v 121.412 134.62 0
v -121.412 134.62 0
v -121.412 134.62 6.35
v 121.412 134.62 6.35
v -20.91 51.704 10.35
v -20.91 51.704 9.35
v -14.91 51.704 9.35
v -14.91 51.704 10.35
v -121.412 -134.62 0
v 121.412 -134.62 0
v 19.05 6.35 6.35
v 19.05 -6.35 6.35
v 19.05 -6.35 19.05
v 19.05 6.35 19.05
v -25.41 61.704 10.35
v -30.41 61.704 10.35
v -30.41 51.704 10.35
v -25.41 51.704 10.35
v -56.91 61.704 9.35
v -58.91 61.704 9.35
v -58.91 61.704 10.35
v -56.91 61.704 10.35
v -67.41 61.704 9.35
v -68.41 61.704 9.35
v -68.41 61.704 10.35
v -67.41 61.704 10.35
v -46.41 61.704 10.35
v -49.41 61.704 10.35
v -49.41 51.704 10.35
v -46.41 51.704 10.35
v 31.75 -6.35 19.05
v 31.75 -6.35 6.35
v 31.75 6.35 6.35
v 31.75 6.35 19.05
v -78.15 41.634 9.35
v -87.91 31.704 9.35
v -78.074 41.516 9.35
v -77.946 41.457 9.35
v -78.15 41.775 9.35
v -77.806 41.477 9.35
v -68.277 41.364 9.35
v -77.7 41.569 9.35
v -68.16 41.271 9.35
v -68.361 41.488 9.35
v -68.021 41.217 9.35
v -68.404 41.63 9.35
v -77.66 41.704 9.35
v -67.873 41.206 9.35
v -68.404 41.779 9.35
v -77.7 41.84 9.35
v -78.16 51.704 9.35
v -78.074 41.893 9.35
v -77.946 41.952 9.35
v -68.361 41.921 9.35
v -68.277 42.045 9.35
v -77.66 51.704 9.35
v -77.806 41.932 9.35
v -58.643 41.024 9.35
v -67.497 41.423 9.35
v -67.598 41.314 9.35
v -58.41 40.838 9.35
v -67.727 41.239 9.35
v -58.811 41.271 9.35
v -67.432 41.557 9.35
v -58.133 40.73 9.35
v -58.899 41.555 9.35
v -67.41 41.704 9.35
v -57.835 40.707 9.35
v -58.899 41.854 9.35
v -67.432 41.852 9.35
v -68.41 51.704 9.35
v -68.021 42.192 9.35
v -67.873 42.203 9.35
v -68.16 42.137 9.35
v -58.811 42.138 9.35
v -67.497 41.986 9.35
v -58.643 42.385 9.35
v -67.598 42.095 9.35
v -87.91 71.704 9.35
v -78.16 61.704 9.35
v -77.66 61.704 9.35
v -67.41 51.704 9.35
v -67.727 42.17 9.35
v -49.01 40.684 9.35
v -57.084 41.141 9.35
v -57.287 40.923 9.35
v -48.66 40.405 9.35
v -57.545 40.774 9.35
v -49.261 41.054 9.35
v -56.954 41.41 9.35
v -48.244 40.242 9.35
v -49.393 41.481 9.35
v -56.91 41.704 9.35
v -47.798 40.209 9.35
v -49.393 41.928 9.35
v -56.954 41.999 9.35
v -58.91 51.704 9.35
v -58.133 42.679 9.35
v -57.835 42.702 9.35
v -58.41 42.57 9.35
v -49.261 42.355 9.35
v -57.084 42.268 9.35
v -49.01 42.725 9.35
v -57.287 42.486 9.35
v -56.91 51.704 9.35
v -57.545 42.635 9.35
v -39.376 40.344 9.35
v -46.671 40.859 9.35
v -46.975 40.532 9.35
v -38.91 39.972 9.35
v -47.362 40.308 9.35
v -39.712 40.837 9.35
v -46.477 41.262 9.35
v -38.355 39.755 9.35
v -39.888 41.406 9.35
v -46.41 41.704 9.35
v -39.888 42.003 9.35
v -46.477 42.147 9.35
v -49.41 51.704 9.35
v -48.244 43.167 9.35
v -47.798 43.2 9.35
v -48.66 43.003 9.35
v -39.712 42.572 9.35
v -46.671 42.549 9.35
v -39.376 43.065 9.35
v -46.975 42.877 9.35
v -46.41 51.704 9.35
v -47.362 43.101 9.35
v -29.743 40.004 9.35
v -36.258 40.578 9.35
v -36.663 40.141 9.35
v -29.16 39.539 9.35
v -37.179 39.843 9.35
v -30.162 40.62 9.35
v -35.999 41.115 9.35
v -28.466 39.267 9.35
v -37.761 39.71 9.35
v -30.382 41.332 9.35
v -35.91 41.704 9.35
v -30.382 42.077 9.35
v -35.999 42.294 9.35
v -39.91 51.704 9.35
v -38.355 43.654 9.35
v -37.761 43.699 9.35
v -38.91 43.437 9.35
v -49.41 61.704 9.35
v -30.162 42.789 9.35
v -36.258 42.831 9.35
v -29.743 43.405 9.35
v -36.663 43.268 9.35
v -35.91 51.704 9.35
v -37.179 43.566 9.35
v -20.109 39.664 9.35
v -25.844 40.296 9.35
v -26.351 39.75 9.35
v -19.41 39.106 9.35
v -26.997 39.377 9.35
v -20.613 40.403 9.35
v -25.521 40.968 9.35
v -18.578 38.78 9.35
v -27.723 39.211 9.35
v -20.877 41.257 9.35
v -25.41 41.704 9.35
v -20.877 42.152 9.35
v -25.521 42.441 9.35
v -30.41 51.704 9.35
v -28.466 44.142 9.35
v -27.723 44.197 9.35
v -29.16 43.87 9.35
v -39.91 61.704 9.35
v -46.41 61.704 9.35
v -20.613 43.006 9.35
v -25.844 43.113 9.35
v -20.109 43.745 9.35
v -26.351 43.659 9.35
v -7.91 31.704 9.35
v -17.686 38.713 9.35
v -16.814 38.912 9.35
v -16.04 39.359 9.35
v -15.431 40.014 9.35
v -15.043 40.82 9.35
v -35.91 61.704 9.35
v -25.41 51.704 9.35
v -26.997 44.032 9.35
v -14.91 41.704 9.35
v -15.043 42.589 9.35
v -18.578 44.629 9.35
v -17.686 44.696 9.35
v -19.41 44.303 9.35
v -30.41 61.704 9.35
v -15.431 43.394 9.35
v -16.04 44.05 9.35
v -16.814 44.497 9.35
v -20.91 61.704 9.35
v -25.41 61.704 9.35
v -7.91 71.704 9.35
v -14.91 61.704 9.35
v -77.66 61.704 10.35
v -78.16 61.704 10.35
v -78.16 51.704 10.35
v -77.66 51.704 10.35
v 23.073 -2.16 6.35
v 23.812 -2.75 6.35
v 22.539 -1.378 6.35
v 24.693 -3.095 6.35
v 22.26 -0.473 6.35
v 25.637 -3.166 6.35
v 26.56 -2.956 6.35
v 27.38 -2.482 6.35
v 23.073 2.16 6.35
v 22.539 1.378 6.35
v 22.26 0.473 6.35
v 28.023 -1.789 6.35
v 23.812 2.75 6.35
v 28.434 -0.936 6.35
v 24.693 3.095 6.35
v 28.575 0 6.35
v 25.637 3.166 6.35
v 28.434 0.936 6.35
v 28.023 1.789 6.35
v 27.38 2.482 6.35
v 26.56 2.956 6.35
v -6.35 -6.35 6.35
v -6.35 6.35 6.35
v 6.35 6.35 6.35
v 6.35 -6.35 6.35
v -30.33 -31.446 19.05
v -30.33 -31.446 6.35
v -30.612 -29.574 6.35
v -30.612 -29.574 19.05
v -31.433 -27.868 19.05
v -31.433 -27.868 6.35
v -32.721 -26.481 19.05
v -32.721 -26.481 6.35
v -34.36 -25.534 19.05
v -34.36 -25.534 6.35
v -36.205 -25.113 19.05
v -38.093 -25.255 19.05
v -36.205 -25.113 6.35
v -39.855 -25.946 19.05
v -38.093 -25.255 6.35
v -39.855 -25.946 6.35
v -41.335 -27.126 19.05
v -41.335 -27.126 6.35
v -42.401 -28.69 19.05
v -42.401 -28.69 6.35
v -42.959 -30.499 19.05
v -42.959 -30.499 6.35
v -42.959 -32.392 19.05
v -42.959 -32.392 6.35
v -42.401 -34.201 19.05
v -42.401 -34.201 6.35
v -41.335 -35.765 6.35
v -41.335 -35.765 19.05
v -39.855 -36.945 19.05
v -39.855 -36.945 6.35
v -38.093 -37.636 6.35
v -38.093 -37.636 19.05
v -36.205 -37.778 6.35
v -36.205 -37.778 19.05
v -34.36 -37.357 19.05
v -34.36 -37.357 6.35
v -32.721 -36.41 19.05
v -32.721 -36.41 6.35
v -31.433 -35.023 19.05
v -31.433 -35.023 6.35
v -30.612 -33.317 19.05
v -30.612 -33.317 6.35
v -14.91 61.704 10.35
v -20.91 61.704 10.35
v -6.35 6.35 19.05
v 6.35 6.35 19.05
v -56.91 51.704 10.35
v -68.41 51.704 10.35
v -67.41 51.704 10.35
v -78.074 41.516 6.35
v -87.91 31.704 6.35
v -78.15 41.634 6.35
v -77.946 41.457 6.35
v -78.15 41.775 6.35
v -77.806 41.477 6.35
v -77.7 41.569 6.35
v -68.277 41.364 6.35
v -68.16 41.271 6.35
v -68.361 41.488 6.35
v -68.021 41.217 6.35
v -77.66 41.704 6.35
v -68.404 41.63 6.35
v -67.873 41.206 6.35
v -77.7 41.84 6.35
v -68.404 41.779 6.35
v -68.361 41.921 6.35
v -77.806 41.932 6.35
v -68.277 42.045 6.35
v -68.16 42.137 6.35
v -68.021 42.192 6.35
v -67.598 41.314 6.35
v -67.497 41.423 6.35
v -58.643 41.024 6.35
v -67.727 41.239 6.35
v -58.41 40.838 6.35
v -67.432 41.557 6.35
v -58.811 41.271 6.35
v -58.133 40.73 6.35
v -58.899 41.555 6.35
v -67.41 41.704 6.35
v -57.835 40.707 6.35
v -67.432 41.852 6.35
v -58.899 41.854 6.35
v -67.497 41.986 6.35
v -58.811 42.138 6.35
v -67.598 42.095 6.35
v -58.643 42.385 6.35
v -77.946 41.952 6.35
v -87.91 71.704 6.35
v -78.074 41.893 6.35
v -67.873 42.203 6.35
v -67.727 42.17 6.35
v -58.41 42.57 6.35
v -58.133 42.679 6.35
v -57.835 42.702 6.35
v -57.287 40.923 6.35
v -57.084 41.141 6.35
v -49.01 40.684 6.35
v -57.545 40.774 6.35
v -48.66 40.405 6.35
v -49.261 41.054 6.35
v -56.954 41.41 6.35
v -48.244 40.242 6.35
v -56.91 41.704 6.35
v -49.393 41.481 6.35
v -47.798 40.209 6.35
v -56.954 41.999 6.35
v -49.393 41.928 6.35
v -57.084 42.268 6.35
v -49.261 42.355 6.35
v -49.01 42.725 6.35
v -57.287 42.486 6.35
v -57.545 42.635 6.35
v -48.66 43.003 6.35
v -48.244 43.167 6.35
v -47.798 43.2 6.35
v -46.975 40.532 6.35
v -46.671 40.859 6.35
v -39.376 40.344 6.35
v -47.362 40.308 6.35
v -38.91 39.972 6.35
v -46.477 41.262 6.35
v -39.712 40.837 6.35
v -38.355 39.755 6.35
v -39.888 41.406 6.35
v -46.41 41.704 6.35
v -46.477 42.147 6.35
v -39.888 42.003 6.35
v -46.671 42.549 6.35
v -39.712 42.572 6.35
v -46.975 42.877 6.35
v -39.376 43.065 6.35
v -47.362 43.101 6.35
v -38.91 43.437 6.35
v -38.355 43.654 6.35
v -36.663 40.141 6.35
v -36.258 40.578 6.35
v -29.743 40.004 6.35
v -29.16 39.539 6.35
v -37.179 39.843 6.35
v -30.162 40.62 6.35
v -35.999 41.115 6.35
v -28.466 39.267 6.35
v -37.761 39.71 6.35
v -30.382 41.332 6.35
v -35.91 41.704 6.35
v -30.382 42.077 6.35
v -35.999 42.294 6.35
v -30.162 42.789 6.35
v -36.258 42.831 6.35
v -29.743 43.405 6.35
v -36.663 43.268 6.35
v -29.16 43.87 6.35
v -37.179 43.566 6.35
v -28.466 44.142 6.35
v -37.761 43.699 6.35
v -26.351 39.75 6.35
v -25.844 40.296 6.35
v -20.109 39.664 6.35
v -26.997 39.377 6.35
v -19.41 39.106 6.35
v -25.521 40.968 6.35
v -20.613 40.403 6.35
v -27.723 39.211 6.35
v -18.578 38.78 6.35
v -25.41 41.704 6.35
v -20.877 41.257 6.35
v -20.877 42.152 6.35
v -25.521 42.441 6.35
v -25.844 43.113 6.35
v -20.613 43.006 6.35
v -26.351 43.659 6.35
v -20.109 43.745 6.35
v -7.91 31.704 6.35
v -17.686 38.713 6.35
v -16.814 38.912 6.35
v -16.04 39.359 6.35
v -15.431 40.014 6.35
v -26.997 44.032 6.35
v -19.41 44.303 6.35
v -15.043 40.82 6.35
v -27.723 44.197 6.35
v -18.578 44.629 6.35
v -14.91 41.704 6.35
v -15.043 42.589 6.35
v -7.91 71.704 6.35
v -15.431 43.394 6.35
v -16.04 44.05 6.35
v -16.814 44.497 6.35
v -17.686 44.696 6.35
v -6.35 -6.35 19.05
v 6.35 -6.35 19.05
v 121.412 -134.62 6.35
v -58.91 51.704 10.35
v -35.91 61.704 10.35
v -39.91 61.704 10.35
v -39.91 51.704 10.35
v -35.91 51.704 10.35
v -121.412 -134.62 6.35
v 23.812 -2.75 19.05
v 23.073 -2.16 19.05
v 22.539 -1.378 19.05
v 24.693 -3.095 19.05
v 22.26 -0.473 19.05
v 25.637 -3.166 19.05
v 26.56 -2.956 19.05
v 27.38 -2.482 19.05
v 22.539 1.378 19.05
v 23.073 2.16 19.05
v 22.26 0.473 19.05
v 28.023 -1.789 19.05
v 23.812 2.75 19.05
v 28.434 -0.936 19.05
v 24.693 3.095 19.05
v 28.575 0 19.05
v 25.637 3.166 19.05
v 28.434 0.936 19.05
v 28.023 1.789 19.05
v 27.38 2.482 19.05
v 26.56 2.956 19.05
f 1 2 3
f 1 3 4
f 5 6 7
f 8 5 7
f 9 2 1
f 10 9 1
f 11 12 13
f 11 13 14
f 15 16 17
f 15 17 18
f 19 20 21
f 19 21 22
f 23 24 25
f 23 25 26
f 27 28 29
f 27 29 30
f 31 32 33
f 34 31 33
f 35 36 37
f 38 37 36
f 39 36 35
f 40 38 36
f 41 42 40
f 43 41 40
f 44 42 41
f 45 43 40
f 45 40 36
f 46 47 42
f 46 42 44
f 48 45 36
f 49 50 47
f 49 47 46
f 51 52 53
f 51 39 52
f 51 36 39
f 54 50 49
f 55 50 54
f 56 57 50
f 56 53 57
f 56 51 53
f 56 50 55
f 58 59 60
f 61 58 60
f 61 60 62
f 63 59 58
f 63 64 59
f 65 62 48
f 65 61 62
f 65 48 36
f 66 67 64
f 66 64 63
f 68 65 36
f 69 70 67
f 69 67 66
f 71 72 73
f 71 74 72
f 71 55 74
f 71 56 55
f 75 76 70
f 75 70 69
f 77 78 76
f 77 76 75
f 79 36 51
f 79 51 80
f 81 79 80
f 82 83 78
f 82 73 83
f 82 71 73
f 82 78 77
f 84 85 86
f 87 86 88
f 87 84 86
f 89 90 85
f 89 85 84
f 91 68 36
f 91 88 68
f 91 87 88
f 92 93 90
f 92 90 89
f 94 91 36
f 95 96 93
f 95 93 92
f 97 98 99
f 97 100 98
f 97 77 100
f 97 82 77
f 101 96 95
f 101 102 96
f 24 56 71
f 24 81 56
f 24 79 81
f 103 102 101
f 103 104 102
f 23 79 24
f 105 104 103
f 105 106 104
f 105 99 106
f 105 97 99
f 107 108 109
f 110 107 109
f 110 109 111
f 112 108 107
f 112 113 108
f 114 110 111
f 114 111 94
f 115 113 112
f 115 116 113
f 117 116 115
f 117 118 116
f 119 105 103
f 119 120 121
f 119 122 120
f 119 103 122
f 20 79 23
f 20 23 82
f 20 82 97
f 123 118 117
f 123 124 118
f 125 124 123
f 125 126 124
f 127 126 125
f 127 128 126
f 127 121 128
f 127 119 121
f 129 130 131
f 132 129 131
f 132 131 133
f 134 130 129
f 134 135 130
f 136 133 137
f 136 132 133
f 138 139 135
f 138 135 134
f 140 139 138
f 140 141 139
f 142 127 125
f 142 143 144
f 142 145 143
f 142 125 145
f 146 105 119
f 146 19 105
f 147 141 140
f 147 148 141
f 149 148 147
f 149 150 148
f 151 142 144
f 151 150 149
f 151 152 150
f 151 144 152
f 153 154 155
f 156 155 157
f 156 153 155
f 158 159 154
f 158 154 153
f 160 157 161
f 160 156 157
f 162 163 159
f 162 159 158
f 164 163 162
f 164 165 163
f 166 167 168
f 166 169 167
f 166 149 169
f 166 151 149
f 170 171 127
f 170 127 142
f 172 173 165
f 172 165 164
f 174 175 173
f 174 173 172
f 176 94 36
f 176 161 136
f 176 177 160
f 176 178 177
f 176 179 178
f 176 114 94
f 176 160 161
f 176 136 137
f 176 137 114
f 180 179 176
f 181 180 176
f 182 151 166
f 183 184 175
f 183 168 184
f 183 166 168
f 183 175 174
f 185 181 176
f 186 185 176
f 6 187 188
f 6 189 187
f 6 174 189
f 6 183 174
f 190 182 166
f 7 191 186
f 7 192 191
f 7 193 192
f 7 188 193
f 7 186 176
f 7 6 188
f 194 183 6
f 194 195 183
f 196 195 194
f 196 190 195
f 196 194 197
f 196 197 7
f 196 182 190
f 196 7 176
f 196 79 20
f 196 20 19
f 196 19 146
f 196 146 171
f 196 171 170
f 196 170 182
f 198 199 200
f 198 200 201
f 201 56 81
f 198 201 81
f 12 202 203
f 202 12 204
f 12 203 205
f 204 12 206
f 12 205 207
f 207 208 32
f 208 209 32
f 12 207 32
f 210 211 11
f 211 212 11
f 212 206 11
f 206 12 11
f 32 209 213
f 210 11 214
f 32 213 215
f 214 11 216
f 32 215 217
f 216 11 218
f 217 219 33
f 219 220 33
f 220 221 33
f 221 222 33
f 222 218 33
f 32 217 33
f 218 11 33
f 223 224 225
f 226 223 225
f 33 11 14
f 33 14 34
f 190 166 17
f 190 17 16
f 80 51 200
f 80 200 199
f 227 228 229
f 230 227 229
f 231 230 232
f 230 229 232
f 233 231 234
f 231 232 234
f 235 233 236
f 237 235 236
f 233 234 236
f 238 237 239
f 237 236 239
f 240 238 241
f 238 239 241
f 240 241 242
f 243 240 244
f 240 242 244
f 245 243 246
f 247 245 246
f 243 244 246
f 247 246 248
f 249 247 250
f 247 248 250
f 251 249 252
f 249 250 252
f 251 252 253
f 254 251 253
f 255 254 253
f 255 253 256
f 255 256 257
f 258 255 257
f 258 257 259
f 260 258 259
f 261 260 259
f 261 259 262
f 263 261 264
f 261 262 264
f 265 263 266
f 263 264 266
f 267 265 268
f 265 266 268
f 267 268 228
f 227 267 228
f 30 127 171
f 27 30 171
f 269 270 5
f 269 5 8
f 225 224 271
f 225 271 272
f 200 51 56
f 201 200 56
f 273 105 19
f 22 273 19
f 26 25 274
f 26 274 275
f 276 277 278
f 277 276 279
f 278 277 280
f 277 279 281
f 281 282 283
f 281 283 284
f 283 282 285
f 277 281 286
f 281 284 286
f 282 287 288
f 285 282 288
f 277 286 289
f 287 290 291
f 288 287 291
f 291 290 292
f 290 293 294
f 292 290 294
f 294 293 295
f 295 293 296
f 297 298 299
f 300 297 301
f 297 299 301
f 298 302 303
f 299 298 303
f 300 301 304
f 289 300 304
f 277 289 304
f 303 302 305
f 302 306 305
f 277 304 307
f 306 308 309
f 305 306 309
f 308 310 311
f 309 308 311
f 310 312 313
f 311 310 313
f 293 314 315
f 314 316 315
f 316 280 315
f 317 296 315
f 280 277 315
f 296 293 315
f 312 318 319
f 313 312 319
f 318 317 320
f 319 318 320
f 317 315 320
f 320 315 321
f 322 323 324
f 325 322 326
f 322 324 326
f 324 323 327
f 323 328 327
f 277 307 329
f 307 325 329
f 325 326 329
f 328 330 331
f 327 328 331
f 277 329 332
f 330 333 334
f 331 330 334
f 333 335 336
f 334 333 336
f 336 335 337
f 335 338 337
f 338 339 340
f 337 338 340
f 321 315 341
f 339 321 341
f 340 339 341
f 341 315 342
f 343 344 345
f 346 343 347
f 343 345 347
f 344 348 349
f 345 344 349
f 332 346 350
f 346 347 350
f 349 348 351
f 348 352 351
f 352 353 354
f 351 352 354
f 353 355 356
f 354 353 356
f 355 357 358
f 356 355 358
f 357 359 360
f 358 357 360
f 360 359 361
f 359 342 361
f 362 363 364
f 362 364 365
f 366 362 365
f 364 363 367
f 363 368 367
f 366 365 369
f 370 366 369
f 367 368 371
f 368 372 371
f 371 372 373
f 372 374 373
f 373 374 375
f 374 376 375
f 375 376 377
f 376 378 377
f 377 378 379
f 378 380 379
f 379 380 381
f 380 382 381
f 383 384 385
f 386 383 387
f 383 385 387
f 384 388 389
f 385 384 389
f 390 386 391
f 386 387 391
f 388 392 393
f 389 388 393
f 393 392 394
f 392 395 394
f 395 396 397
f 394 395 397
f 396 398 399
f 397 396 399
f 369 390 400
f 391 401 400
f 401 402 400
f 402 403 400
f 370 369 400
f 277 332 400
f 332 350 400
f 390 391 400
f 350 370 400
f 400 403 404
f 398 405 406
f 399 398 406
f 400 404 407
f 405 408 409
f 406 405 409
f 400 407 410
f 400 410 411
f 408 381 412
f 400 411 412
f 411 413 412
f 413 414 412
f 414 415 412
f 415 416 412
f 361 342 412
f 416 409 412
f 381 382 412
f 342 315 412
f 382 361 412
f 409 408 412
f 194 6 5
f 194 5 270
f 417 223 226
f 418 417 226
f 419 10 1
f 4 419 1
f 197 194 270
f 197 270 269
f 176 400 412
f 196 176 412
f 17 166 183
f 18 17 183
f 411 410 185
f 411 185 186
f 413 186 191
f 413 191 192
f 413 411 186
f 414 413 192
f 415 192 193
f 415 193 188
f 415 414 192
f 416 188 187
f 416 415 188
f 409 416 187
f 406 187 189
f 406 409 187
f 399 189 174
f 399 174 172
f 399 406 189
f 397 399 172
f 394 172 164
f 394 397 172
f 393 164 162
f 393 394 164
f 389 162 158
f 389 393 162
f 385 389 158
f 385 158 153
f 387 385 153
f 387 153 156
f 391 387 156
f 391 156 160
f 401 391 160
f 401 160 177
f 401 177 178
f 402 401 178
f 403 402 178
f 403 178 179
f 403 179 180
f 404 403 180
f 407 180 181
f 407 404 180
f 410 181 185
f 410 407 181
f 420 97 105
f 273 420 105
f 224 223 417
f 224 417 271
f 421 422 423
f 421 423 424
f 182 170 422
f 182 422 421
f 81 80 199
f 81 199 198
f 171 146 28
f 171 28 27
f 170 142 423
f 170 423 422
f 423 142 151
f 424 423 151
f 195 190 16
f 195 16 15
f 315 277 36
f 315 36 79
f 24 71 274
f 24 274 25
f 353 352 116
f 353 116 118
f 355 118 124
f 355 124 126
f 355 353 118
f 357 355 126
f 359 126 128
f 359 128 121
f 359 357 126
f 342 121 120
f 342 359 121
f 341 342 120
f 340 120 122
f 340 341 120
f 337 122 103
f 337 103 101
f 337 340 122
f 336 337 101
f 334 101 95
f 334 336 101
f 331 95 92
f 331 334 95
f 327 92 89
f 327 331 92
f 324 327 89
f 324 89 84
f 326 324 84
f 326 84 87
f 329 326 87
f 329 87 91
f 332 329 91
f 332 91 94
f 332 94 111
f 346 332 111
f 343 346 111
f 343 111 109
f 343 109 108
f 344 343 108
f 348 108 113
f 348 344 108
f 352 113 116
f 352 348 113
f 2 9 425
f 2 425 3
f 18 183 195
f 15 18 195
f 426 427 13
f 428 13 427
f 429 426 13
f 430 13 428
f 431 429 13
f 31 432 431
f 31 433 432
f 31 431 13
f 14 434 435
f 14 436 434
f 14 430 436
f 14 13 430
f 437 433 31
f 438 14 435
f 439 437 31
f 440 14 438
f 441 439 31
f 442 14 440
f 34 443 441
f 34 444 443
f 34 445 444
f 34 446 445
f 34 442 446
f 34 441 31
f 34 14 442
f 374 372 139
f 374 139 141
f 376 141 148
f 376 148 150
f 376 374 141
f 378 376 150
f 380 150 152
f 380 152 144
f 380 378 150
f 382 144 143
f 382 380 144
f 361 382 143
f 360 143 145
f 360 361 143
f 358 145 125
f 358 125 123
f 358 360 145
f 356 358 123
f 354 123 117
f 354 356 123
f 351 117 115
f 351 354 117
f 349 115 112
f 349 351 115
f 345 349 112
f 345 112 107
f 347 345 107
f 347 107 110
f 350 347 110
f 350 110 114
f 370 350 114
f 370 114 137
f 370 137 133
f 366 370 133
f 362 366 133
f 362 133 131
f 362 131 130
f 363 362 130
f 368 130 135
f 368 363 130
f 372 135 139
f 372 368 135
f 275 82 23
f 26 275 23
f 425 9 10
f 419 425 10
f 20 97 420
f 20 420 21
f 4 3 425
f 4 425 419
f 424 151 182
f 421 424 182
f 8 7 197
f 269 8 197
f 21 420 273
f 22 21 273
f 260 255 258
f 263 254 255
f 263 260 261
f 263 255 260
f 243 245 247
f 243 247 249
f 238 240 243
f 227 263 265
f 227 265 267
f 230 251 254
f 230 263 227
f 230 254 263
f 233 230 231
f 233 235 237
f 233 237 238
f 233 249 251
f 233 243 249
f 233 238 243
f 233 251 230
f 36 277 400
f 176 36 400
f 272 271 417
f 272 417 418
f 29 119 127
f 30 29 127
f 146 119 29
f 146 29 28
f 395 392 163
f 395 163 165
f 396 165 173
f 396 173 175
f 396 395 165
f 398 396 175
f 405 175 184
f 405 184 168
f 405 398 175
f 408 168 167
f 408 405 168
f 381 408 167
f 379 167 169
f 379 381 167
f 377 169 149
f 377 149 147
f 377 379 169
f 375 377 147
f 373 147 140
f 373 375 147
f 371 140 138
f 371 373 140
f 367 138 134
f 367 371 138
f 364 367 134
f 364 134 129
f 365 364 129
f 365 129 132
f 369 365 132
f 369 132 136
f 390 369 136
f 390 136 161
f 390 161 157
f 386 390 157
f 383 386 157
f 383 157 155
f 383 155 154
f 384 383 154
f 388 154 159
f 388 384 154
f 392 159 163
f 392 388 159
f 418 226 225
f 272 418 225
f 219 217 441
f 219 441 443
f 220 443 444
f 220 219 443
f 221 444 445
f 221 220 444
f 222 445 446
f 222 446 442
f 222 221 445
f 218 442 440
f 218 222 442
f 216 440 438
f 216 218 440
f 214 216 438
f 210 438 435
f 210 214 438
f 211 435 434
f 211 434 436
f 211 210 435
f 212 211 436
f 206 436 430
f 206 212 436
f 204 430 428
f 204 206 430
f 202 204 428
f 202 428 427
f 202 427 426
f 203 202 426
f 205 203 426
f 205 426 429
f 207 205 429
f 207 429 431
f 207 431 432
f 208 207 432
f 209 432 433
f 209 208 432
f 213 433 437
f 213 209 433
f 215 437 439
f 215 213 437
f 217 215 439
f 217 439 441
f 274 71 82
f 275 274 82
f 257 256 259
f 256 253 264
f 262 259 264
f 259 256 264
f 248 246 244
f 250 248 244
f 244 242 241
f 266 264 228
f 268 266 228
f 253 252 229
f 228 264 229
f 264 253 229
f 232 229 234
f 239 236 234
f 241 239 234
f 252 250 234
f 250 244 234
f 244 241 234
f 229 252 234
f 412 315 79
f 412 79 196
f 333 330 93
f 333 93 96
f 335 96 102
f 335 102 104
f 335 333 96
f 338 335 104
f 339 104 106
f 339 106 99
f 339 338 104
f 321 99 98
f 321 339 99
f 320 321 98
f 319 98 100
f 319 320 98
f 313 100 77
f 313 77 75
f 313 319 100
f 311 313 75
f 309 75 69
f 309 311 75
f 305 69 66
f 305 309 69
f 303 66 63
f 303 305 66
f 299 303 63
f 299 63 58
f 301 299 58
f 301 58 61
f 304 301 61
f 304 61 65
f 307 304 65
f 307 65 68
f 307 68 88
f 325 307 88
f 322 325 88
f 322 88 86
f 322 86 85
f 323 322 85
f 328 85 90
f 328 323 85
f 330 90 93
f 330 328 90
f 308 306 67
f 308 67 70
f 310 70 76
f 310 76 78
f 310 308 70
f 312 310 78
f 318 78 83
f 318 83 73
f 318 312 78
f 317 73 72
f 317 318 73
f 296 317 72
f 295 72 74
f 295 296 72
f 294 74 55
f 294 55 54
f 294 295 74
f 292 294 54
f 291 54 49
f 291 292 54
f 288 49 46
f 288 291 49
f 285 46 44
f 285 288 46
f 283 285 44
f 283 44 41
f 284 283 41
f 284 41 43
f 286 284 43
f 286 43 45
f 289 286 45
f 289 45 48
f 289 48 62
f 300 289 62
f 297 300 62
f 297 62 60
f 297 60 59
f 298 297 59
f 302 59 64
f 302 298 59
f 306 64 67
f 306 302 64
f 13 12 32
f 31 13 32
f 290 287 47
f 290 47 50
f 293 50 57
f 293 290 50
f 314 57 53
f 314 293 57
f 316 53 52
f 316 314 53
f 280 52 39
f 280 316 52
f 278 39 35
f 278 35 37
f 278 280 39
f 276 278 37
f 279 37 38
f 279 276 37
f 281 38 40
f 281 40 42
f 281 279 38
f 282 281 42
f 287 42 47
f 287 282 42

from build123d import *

# Parameters (mm, degrees)
F0_W      = 242.824
F0_H      = 269.24
F1_DEPTH  = 6.35
F2_W      = 12.7
F2_H      = 12.7
F3_DEPTH  = 12.7
F4_W      = 12.7
F4_H      = 12.7
F4_R      = 3.175
F5_DEPTH  = 12.7
F6_R      = 6.35
F7_DEPTH  = 12.7
F8_W      = 80
F8_H      = 40
F8_R      = 0.25
F8_R_2    = 0.5
F8_W_2    = 0.5
F8_H_2    = 10
F8_W_3    = 1
F8_R_3    = 1
F8_R_4    = 1.5
F8_R_5    = 2
F8_W_4    = 2
F8_W_5    = 3
F8_W_6    = 4
F8_R_6    = 2.5
F8_R_7    = 3
F8_W_7    = 5
F8_W_8    = 6
F9_DEPTH  = 3
F10_DEPTH = 4


with BuildPart() as f1:
    # F0 (on Top) → F1 (new body)
    with BuildSketch(Plane.XY):
        Rectangle(F0_W, F0_H)
    extrude(amount=F1_DEPTH)


with BuildPart() as f3:
    # F2 (on face) → F3 (new body)
    with BuildSketch(Plane.XY.offset(6.35)):
        Rectangle(F2_W, F2_H)
    extrude(amount=F3_DEPTH)


with BuildPart() as f5:
    # F4 (on face) → F5 (new body)
    with BuildSketch(Plane.XY.offset(6.35)):
        with Locations((25.4, 0)):
            Rectangle(F4_W, F4_H)
        with Locations((25.4, 0)):
            Circle(F4_R, mode=Mode.SUBTRACT)
    extrude(amount=F5_DEPTH)


with BuildPart() as f7:
    # F6 (on face) → F7 (new body)
    with BuildSketch(Plane.XY.offset(6.35)):
        with Locations((-36.6800241172, -31.4455367625)):
            Circle(F6_R)
    extrude(amount=F7_DEPTH)


with BuildPart() as f9:
    # F8 (on face) → F9 (new body)
    with BuildSketch(Plane.XY.offset(6.35)):
        with Locations((-47.9100285936, 51.7044578493)):
            Rectangle(F8_W, F8_H)
        with Locations((-77.9100285936, 41.7044578493)):
            Circle(F8_R, mode=Mode.SUBTRACT)
        with Locations((-67.9100285936, 41.7044578493)):
            Circle(F8_R_2, mode=Mode.SUBTRACT)
        with Locations((-77.9100285936, 56.7044578493)):
            Rectangle(F8_W_2, F8_H_2, mode=Mode.SUBTRACT)
        with Locations((-67.9100285936, 56.7044578493)):
            Rectangle(F8_W_3, F8_H_2, mode=Mode.SUBTRACT)
        with Locations((-57.9100285936, 41.7044578493)):
            Circle(F8_R_3, mode=Mode.SUBTRACT)
        with Locations((-47.9100285936, 41.7044578493)):
            Circle(F8_R_4, mode=Mode.SUBTRACT)
        with Locations((-37.9100285936, 41.7044578493)):
            Circle(F8_R_5, mode=Mode.SUBTRACT)
        with Locations((-57.9100285936, 56.7044578493)):
            Rectangle(F8_W_4, F8_H_2, mode=Mode.SUBTRACT)
        with Locations((-47.9100285936, 56.7044578493)):
            Rectangle(F8_W_5, F8_H_2, mode=Mode.SUBTRACT)
        with Locations((-37.9100285936, 56.7044578493)):
            Rectangle(F8_W_6, F8_H_2, mode=Mode.SUBTRACT)
        with Locations((-27.9100285936, 41.7044578493)):
            Circle(F8_R_6, mode=Mode.SUBTRACT)
        with Locations((-17.9100285936, 41.7044578493)):
            Circle(F8_R_7, mode=Mode.SUBTRACT)
        with Locations((-27.9100285936, 56.7044578493)):
            Rectangle(F8_W_7, F8_H_2, mode=Mode.SUBTRACT)
        with Locations((-17.9100285936, 56.7044578493)):
            Rectangle(F8_W_8, F8_H_2, mode=Mode.SUBTRACT)
    extrude(amount=F9_DEPTH)

    # F8 (on face) → F10 (join)
    with BuildSketch(Plane.XY.offset(6.35)):
        with Locations((-17.9100285936, 56.7044578493)):
            Rectangle(F8_W_8, F8_H_2)
        with Locations((-27.9100285936, 56.7044578493)):
            Rectangle(F8_W_7, F8_H_2)
        with Locations((-37.9100285936, 56.7044578493)):
            Rectangle(F8_W_6, F8_H_2)
        with Locations((-47.9100285936, 56.7044578493)):
            Rectangle(F8_W_5, F8_H_2)
        with Locations((-57.9100285936, 56.7044578493)):
            Rectangle(F8_W_4, F8_H_2)
        with Locations((-67.9100285936, 56.7044578493)):
            Rectangle(F8_W_3, F8_H_2)
        with Locations((-77.9100285936, 56.7044578493)):
            Rectangle(F8_W_2, F8_H_2)
    extrude(amount=F10_DEPTH)


solid = Compound([f1.part, f3.part, f5.part, f7.part, f9.part])
